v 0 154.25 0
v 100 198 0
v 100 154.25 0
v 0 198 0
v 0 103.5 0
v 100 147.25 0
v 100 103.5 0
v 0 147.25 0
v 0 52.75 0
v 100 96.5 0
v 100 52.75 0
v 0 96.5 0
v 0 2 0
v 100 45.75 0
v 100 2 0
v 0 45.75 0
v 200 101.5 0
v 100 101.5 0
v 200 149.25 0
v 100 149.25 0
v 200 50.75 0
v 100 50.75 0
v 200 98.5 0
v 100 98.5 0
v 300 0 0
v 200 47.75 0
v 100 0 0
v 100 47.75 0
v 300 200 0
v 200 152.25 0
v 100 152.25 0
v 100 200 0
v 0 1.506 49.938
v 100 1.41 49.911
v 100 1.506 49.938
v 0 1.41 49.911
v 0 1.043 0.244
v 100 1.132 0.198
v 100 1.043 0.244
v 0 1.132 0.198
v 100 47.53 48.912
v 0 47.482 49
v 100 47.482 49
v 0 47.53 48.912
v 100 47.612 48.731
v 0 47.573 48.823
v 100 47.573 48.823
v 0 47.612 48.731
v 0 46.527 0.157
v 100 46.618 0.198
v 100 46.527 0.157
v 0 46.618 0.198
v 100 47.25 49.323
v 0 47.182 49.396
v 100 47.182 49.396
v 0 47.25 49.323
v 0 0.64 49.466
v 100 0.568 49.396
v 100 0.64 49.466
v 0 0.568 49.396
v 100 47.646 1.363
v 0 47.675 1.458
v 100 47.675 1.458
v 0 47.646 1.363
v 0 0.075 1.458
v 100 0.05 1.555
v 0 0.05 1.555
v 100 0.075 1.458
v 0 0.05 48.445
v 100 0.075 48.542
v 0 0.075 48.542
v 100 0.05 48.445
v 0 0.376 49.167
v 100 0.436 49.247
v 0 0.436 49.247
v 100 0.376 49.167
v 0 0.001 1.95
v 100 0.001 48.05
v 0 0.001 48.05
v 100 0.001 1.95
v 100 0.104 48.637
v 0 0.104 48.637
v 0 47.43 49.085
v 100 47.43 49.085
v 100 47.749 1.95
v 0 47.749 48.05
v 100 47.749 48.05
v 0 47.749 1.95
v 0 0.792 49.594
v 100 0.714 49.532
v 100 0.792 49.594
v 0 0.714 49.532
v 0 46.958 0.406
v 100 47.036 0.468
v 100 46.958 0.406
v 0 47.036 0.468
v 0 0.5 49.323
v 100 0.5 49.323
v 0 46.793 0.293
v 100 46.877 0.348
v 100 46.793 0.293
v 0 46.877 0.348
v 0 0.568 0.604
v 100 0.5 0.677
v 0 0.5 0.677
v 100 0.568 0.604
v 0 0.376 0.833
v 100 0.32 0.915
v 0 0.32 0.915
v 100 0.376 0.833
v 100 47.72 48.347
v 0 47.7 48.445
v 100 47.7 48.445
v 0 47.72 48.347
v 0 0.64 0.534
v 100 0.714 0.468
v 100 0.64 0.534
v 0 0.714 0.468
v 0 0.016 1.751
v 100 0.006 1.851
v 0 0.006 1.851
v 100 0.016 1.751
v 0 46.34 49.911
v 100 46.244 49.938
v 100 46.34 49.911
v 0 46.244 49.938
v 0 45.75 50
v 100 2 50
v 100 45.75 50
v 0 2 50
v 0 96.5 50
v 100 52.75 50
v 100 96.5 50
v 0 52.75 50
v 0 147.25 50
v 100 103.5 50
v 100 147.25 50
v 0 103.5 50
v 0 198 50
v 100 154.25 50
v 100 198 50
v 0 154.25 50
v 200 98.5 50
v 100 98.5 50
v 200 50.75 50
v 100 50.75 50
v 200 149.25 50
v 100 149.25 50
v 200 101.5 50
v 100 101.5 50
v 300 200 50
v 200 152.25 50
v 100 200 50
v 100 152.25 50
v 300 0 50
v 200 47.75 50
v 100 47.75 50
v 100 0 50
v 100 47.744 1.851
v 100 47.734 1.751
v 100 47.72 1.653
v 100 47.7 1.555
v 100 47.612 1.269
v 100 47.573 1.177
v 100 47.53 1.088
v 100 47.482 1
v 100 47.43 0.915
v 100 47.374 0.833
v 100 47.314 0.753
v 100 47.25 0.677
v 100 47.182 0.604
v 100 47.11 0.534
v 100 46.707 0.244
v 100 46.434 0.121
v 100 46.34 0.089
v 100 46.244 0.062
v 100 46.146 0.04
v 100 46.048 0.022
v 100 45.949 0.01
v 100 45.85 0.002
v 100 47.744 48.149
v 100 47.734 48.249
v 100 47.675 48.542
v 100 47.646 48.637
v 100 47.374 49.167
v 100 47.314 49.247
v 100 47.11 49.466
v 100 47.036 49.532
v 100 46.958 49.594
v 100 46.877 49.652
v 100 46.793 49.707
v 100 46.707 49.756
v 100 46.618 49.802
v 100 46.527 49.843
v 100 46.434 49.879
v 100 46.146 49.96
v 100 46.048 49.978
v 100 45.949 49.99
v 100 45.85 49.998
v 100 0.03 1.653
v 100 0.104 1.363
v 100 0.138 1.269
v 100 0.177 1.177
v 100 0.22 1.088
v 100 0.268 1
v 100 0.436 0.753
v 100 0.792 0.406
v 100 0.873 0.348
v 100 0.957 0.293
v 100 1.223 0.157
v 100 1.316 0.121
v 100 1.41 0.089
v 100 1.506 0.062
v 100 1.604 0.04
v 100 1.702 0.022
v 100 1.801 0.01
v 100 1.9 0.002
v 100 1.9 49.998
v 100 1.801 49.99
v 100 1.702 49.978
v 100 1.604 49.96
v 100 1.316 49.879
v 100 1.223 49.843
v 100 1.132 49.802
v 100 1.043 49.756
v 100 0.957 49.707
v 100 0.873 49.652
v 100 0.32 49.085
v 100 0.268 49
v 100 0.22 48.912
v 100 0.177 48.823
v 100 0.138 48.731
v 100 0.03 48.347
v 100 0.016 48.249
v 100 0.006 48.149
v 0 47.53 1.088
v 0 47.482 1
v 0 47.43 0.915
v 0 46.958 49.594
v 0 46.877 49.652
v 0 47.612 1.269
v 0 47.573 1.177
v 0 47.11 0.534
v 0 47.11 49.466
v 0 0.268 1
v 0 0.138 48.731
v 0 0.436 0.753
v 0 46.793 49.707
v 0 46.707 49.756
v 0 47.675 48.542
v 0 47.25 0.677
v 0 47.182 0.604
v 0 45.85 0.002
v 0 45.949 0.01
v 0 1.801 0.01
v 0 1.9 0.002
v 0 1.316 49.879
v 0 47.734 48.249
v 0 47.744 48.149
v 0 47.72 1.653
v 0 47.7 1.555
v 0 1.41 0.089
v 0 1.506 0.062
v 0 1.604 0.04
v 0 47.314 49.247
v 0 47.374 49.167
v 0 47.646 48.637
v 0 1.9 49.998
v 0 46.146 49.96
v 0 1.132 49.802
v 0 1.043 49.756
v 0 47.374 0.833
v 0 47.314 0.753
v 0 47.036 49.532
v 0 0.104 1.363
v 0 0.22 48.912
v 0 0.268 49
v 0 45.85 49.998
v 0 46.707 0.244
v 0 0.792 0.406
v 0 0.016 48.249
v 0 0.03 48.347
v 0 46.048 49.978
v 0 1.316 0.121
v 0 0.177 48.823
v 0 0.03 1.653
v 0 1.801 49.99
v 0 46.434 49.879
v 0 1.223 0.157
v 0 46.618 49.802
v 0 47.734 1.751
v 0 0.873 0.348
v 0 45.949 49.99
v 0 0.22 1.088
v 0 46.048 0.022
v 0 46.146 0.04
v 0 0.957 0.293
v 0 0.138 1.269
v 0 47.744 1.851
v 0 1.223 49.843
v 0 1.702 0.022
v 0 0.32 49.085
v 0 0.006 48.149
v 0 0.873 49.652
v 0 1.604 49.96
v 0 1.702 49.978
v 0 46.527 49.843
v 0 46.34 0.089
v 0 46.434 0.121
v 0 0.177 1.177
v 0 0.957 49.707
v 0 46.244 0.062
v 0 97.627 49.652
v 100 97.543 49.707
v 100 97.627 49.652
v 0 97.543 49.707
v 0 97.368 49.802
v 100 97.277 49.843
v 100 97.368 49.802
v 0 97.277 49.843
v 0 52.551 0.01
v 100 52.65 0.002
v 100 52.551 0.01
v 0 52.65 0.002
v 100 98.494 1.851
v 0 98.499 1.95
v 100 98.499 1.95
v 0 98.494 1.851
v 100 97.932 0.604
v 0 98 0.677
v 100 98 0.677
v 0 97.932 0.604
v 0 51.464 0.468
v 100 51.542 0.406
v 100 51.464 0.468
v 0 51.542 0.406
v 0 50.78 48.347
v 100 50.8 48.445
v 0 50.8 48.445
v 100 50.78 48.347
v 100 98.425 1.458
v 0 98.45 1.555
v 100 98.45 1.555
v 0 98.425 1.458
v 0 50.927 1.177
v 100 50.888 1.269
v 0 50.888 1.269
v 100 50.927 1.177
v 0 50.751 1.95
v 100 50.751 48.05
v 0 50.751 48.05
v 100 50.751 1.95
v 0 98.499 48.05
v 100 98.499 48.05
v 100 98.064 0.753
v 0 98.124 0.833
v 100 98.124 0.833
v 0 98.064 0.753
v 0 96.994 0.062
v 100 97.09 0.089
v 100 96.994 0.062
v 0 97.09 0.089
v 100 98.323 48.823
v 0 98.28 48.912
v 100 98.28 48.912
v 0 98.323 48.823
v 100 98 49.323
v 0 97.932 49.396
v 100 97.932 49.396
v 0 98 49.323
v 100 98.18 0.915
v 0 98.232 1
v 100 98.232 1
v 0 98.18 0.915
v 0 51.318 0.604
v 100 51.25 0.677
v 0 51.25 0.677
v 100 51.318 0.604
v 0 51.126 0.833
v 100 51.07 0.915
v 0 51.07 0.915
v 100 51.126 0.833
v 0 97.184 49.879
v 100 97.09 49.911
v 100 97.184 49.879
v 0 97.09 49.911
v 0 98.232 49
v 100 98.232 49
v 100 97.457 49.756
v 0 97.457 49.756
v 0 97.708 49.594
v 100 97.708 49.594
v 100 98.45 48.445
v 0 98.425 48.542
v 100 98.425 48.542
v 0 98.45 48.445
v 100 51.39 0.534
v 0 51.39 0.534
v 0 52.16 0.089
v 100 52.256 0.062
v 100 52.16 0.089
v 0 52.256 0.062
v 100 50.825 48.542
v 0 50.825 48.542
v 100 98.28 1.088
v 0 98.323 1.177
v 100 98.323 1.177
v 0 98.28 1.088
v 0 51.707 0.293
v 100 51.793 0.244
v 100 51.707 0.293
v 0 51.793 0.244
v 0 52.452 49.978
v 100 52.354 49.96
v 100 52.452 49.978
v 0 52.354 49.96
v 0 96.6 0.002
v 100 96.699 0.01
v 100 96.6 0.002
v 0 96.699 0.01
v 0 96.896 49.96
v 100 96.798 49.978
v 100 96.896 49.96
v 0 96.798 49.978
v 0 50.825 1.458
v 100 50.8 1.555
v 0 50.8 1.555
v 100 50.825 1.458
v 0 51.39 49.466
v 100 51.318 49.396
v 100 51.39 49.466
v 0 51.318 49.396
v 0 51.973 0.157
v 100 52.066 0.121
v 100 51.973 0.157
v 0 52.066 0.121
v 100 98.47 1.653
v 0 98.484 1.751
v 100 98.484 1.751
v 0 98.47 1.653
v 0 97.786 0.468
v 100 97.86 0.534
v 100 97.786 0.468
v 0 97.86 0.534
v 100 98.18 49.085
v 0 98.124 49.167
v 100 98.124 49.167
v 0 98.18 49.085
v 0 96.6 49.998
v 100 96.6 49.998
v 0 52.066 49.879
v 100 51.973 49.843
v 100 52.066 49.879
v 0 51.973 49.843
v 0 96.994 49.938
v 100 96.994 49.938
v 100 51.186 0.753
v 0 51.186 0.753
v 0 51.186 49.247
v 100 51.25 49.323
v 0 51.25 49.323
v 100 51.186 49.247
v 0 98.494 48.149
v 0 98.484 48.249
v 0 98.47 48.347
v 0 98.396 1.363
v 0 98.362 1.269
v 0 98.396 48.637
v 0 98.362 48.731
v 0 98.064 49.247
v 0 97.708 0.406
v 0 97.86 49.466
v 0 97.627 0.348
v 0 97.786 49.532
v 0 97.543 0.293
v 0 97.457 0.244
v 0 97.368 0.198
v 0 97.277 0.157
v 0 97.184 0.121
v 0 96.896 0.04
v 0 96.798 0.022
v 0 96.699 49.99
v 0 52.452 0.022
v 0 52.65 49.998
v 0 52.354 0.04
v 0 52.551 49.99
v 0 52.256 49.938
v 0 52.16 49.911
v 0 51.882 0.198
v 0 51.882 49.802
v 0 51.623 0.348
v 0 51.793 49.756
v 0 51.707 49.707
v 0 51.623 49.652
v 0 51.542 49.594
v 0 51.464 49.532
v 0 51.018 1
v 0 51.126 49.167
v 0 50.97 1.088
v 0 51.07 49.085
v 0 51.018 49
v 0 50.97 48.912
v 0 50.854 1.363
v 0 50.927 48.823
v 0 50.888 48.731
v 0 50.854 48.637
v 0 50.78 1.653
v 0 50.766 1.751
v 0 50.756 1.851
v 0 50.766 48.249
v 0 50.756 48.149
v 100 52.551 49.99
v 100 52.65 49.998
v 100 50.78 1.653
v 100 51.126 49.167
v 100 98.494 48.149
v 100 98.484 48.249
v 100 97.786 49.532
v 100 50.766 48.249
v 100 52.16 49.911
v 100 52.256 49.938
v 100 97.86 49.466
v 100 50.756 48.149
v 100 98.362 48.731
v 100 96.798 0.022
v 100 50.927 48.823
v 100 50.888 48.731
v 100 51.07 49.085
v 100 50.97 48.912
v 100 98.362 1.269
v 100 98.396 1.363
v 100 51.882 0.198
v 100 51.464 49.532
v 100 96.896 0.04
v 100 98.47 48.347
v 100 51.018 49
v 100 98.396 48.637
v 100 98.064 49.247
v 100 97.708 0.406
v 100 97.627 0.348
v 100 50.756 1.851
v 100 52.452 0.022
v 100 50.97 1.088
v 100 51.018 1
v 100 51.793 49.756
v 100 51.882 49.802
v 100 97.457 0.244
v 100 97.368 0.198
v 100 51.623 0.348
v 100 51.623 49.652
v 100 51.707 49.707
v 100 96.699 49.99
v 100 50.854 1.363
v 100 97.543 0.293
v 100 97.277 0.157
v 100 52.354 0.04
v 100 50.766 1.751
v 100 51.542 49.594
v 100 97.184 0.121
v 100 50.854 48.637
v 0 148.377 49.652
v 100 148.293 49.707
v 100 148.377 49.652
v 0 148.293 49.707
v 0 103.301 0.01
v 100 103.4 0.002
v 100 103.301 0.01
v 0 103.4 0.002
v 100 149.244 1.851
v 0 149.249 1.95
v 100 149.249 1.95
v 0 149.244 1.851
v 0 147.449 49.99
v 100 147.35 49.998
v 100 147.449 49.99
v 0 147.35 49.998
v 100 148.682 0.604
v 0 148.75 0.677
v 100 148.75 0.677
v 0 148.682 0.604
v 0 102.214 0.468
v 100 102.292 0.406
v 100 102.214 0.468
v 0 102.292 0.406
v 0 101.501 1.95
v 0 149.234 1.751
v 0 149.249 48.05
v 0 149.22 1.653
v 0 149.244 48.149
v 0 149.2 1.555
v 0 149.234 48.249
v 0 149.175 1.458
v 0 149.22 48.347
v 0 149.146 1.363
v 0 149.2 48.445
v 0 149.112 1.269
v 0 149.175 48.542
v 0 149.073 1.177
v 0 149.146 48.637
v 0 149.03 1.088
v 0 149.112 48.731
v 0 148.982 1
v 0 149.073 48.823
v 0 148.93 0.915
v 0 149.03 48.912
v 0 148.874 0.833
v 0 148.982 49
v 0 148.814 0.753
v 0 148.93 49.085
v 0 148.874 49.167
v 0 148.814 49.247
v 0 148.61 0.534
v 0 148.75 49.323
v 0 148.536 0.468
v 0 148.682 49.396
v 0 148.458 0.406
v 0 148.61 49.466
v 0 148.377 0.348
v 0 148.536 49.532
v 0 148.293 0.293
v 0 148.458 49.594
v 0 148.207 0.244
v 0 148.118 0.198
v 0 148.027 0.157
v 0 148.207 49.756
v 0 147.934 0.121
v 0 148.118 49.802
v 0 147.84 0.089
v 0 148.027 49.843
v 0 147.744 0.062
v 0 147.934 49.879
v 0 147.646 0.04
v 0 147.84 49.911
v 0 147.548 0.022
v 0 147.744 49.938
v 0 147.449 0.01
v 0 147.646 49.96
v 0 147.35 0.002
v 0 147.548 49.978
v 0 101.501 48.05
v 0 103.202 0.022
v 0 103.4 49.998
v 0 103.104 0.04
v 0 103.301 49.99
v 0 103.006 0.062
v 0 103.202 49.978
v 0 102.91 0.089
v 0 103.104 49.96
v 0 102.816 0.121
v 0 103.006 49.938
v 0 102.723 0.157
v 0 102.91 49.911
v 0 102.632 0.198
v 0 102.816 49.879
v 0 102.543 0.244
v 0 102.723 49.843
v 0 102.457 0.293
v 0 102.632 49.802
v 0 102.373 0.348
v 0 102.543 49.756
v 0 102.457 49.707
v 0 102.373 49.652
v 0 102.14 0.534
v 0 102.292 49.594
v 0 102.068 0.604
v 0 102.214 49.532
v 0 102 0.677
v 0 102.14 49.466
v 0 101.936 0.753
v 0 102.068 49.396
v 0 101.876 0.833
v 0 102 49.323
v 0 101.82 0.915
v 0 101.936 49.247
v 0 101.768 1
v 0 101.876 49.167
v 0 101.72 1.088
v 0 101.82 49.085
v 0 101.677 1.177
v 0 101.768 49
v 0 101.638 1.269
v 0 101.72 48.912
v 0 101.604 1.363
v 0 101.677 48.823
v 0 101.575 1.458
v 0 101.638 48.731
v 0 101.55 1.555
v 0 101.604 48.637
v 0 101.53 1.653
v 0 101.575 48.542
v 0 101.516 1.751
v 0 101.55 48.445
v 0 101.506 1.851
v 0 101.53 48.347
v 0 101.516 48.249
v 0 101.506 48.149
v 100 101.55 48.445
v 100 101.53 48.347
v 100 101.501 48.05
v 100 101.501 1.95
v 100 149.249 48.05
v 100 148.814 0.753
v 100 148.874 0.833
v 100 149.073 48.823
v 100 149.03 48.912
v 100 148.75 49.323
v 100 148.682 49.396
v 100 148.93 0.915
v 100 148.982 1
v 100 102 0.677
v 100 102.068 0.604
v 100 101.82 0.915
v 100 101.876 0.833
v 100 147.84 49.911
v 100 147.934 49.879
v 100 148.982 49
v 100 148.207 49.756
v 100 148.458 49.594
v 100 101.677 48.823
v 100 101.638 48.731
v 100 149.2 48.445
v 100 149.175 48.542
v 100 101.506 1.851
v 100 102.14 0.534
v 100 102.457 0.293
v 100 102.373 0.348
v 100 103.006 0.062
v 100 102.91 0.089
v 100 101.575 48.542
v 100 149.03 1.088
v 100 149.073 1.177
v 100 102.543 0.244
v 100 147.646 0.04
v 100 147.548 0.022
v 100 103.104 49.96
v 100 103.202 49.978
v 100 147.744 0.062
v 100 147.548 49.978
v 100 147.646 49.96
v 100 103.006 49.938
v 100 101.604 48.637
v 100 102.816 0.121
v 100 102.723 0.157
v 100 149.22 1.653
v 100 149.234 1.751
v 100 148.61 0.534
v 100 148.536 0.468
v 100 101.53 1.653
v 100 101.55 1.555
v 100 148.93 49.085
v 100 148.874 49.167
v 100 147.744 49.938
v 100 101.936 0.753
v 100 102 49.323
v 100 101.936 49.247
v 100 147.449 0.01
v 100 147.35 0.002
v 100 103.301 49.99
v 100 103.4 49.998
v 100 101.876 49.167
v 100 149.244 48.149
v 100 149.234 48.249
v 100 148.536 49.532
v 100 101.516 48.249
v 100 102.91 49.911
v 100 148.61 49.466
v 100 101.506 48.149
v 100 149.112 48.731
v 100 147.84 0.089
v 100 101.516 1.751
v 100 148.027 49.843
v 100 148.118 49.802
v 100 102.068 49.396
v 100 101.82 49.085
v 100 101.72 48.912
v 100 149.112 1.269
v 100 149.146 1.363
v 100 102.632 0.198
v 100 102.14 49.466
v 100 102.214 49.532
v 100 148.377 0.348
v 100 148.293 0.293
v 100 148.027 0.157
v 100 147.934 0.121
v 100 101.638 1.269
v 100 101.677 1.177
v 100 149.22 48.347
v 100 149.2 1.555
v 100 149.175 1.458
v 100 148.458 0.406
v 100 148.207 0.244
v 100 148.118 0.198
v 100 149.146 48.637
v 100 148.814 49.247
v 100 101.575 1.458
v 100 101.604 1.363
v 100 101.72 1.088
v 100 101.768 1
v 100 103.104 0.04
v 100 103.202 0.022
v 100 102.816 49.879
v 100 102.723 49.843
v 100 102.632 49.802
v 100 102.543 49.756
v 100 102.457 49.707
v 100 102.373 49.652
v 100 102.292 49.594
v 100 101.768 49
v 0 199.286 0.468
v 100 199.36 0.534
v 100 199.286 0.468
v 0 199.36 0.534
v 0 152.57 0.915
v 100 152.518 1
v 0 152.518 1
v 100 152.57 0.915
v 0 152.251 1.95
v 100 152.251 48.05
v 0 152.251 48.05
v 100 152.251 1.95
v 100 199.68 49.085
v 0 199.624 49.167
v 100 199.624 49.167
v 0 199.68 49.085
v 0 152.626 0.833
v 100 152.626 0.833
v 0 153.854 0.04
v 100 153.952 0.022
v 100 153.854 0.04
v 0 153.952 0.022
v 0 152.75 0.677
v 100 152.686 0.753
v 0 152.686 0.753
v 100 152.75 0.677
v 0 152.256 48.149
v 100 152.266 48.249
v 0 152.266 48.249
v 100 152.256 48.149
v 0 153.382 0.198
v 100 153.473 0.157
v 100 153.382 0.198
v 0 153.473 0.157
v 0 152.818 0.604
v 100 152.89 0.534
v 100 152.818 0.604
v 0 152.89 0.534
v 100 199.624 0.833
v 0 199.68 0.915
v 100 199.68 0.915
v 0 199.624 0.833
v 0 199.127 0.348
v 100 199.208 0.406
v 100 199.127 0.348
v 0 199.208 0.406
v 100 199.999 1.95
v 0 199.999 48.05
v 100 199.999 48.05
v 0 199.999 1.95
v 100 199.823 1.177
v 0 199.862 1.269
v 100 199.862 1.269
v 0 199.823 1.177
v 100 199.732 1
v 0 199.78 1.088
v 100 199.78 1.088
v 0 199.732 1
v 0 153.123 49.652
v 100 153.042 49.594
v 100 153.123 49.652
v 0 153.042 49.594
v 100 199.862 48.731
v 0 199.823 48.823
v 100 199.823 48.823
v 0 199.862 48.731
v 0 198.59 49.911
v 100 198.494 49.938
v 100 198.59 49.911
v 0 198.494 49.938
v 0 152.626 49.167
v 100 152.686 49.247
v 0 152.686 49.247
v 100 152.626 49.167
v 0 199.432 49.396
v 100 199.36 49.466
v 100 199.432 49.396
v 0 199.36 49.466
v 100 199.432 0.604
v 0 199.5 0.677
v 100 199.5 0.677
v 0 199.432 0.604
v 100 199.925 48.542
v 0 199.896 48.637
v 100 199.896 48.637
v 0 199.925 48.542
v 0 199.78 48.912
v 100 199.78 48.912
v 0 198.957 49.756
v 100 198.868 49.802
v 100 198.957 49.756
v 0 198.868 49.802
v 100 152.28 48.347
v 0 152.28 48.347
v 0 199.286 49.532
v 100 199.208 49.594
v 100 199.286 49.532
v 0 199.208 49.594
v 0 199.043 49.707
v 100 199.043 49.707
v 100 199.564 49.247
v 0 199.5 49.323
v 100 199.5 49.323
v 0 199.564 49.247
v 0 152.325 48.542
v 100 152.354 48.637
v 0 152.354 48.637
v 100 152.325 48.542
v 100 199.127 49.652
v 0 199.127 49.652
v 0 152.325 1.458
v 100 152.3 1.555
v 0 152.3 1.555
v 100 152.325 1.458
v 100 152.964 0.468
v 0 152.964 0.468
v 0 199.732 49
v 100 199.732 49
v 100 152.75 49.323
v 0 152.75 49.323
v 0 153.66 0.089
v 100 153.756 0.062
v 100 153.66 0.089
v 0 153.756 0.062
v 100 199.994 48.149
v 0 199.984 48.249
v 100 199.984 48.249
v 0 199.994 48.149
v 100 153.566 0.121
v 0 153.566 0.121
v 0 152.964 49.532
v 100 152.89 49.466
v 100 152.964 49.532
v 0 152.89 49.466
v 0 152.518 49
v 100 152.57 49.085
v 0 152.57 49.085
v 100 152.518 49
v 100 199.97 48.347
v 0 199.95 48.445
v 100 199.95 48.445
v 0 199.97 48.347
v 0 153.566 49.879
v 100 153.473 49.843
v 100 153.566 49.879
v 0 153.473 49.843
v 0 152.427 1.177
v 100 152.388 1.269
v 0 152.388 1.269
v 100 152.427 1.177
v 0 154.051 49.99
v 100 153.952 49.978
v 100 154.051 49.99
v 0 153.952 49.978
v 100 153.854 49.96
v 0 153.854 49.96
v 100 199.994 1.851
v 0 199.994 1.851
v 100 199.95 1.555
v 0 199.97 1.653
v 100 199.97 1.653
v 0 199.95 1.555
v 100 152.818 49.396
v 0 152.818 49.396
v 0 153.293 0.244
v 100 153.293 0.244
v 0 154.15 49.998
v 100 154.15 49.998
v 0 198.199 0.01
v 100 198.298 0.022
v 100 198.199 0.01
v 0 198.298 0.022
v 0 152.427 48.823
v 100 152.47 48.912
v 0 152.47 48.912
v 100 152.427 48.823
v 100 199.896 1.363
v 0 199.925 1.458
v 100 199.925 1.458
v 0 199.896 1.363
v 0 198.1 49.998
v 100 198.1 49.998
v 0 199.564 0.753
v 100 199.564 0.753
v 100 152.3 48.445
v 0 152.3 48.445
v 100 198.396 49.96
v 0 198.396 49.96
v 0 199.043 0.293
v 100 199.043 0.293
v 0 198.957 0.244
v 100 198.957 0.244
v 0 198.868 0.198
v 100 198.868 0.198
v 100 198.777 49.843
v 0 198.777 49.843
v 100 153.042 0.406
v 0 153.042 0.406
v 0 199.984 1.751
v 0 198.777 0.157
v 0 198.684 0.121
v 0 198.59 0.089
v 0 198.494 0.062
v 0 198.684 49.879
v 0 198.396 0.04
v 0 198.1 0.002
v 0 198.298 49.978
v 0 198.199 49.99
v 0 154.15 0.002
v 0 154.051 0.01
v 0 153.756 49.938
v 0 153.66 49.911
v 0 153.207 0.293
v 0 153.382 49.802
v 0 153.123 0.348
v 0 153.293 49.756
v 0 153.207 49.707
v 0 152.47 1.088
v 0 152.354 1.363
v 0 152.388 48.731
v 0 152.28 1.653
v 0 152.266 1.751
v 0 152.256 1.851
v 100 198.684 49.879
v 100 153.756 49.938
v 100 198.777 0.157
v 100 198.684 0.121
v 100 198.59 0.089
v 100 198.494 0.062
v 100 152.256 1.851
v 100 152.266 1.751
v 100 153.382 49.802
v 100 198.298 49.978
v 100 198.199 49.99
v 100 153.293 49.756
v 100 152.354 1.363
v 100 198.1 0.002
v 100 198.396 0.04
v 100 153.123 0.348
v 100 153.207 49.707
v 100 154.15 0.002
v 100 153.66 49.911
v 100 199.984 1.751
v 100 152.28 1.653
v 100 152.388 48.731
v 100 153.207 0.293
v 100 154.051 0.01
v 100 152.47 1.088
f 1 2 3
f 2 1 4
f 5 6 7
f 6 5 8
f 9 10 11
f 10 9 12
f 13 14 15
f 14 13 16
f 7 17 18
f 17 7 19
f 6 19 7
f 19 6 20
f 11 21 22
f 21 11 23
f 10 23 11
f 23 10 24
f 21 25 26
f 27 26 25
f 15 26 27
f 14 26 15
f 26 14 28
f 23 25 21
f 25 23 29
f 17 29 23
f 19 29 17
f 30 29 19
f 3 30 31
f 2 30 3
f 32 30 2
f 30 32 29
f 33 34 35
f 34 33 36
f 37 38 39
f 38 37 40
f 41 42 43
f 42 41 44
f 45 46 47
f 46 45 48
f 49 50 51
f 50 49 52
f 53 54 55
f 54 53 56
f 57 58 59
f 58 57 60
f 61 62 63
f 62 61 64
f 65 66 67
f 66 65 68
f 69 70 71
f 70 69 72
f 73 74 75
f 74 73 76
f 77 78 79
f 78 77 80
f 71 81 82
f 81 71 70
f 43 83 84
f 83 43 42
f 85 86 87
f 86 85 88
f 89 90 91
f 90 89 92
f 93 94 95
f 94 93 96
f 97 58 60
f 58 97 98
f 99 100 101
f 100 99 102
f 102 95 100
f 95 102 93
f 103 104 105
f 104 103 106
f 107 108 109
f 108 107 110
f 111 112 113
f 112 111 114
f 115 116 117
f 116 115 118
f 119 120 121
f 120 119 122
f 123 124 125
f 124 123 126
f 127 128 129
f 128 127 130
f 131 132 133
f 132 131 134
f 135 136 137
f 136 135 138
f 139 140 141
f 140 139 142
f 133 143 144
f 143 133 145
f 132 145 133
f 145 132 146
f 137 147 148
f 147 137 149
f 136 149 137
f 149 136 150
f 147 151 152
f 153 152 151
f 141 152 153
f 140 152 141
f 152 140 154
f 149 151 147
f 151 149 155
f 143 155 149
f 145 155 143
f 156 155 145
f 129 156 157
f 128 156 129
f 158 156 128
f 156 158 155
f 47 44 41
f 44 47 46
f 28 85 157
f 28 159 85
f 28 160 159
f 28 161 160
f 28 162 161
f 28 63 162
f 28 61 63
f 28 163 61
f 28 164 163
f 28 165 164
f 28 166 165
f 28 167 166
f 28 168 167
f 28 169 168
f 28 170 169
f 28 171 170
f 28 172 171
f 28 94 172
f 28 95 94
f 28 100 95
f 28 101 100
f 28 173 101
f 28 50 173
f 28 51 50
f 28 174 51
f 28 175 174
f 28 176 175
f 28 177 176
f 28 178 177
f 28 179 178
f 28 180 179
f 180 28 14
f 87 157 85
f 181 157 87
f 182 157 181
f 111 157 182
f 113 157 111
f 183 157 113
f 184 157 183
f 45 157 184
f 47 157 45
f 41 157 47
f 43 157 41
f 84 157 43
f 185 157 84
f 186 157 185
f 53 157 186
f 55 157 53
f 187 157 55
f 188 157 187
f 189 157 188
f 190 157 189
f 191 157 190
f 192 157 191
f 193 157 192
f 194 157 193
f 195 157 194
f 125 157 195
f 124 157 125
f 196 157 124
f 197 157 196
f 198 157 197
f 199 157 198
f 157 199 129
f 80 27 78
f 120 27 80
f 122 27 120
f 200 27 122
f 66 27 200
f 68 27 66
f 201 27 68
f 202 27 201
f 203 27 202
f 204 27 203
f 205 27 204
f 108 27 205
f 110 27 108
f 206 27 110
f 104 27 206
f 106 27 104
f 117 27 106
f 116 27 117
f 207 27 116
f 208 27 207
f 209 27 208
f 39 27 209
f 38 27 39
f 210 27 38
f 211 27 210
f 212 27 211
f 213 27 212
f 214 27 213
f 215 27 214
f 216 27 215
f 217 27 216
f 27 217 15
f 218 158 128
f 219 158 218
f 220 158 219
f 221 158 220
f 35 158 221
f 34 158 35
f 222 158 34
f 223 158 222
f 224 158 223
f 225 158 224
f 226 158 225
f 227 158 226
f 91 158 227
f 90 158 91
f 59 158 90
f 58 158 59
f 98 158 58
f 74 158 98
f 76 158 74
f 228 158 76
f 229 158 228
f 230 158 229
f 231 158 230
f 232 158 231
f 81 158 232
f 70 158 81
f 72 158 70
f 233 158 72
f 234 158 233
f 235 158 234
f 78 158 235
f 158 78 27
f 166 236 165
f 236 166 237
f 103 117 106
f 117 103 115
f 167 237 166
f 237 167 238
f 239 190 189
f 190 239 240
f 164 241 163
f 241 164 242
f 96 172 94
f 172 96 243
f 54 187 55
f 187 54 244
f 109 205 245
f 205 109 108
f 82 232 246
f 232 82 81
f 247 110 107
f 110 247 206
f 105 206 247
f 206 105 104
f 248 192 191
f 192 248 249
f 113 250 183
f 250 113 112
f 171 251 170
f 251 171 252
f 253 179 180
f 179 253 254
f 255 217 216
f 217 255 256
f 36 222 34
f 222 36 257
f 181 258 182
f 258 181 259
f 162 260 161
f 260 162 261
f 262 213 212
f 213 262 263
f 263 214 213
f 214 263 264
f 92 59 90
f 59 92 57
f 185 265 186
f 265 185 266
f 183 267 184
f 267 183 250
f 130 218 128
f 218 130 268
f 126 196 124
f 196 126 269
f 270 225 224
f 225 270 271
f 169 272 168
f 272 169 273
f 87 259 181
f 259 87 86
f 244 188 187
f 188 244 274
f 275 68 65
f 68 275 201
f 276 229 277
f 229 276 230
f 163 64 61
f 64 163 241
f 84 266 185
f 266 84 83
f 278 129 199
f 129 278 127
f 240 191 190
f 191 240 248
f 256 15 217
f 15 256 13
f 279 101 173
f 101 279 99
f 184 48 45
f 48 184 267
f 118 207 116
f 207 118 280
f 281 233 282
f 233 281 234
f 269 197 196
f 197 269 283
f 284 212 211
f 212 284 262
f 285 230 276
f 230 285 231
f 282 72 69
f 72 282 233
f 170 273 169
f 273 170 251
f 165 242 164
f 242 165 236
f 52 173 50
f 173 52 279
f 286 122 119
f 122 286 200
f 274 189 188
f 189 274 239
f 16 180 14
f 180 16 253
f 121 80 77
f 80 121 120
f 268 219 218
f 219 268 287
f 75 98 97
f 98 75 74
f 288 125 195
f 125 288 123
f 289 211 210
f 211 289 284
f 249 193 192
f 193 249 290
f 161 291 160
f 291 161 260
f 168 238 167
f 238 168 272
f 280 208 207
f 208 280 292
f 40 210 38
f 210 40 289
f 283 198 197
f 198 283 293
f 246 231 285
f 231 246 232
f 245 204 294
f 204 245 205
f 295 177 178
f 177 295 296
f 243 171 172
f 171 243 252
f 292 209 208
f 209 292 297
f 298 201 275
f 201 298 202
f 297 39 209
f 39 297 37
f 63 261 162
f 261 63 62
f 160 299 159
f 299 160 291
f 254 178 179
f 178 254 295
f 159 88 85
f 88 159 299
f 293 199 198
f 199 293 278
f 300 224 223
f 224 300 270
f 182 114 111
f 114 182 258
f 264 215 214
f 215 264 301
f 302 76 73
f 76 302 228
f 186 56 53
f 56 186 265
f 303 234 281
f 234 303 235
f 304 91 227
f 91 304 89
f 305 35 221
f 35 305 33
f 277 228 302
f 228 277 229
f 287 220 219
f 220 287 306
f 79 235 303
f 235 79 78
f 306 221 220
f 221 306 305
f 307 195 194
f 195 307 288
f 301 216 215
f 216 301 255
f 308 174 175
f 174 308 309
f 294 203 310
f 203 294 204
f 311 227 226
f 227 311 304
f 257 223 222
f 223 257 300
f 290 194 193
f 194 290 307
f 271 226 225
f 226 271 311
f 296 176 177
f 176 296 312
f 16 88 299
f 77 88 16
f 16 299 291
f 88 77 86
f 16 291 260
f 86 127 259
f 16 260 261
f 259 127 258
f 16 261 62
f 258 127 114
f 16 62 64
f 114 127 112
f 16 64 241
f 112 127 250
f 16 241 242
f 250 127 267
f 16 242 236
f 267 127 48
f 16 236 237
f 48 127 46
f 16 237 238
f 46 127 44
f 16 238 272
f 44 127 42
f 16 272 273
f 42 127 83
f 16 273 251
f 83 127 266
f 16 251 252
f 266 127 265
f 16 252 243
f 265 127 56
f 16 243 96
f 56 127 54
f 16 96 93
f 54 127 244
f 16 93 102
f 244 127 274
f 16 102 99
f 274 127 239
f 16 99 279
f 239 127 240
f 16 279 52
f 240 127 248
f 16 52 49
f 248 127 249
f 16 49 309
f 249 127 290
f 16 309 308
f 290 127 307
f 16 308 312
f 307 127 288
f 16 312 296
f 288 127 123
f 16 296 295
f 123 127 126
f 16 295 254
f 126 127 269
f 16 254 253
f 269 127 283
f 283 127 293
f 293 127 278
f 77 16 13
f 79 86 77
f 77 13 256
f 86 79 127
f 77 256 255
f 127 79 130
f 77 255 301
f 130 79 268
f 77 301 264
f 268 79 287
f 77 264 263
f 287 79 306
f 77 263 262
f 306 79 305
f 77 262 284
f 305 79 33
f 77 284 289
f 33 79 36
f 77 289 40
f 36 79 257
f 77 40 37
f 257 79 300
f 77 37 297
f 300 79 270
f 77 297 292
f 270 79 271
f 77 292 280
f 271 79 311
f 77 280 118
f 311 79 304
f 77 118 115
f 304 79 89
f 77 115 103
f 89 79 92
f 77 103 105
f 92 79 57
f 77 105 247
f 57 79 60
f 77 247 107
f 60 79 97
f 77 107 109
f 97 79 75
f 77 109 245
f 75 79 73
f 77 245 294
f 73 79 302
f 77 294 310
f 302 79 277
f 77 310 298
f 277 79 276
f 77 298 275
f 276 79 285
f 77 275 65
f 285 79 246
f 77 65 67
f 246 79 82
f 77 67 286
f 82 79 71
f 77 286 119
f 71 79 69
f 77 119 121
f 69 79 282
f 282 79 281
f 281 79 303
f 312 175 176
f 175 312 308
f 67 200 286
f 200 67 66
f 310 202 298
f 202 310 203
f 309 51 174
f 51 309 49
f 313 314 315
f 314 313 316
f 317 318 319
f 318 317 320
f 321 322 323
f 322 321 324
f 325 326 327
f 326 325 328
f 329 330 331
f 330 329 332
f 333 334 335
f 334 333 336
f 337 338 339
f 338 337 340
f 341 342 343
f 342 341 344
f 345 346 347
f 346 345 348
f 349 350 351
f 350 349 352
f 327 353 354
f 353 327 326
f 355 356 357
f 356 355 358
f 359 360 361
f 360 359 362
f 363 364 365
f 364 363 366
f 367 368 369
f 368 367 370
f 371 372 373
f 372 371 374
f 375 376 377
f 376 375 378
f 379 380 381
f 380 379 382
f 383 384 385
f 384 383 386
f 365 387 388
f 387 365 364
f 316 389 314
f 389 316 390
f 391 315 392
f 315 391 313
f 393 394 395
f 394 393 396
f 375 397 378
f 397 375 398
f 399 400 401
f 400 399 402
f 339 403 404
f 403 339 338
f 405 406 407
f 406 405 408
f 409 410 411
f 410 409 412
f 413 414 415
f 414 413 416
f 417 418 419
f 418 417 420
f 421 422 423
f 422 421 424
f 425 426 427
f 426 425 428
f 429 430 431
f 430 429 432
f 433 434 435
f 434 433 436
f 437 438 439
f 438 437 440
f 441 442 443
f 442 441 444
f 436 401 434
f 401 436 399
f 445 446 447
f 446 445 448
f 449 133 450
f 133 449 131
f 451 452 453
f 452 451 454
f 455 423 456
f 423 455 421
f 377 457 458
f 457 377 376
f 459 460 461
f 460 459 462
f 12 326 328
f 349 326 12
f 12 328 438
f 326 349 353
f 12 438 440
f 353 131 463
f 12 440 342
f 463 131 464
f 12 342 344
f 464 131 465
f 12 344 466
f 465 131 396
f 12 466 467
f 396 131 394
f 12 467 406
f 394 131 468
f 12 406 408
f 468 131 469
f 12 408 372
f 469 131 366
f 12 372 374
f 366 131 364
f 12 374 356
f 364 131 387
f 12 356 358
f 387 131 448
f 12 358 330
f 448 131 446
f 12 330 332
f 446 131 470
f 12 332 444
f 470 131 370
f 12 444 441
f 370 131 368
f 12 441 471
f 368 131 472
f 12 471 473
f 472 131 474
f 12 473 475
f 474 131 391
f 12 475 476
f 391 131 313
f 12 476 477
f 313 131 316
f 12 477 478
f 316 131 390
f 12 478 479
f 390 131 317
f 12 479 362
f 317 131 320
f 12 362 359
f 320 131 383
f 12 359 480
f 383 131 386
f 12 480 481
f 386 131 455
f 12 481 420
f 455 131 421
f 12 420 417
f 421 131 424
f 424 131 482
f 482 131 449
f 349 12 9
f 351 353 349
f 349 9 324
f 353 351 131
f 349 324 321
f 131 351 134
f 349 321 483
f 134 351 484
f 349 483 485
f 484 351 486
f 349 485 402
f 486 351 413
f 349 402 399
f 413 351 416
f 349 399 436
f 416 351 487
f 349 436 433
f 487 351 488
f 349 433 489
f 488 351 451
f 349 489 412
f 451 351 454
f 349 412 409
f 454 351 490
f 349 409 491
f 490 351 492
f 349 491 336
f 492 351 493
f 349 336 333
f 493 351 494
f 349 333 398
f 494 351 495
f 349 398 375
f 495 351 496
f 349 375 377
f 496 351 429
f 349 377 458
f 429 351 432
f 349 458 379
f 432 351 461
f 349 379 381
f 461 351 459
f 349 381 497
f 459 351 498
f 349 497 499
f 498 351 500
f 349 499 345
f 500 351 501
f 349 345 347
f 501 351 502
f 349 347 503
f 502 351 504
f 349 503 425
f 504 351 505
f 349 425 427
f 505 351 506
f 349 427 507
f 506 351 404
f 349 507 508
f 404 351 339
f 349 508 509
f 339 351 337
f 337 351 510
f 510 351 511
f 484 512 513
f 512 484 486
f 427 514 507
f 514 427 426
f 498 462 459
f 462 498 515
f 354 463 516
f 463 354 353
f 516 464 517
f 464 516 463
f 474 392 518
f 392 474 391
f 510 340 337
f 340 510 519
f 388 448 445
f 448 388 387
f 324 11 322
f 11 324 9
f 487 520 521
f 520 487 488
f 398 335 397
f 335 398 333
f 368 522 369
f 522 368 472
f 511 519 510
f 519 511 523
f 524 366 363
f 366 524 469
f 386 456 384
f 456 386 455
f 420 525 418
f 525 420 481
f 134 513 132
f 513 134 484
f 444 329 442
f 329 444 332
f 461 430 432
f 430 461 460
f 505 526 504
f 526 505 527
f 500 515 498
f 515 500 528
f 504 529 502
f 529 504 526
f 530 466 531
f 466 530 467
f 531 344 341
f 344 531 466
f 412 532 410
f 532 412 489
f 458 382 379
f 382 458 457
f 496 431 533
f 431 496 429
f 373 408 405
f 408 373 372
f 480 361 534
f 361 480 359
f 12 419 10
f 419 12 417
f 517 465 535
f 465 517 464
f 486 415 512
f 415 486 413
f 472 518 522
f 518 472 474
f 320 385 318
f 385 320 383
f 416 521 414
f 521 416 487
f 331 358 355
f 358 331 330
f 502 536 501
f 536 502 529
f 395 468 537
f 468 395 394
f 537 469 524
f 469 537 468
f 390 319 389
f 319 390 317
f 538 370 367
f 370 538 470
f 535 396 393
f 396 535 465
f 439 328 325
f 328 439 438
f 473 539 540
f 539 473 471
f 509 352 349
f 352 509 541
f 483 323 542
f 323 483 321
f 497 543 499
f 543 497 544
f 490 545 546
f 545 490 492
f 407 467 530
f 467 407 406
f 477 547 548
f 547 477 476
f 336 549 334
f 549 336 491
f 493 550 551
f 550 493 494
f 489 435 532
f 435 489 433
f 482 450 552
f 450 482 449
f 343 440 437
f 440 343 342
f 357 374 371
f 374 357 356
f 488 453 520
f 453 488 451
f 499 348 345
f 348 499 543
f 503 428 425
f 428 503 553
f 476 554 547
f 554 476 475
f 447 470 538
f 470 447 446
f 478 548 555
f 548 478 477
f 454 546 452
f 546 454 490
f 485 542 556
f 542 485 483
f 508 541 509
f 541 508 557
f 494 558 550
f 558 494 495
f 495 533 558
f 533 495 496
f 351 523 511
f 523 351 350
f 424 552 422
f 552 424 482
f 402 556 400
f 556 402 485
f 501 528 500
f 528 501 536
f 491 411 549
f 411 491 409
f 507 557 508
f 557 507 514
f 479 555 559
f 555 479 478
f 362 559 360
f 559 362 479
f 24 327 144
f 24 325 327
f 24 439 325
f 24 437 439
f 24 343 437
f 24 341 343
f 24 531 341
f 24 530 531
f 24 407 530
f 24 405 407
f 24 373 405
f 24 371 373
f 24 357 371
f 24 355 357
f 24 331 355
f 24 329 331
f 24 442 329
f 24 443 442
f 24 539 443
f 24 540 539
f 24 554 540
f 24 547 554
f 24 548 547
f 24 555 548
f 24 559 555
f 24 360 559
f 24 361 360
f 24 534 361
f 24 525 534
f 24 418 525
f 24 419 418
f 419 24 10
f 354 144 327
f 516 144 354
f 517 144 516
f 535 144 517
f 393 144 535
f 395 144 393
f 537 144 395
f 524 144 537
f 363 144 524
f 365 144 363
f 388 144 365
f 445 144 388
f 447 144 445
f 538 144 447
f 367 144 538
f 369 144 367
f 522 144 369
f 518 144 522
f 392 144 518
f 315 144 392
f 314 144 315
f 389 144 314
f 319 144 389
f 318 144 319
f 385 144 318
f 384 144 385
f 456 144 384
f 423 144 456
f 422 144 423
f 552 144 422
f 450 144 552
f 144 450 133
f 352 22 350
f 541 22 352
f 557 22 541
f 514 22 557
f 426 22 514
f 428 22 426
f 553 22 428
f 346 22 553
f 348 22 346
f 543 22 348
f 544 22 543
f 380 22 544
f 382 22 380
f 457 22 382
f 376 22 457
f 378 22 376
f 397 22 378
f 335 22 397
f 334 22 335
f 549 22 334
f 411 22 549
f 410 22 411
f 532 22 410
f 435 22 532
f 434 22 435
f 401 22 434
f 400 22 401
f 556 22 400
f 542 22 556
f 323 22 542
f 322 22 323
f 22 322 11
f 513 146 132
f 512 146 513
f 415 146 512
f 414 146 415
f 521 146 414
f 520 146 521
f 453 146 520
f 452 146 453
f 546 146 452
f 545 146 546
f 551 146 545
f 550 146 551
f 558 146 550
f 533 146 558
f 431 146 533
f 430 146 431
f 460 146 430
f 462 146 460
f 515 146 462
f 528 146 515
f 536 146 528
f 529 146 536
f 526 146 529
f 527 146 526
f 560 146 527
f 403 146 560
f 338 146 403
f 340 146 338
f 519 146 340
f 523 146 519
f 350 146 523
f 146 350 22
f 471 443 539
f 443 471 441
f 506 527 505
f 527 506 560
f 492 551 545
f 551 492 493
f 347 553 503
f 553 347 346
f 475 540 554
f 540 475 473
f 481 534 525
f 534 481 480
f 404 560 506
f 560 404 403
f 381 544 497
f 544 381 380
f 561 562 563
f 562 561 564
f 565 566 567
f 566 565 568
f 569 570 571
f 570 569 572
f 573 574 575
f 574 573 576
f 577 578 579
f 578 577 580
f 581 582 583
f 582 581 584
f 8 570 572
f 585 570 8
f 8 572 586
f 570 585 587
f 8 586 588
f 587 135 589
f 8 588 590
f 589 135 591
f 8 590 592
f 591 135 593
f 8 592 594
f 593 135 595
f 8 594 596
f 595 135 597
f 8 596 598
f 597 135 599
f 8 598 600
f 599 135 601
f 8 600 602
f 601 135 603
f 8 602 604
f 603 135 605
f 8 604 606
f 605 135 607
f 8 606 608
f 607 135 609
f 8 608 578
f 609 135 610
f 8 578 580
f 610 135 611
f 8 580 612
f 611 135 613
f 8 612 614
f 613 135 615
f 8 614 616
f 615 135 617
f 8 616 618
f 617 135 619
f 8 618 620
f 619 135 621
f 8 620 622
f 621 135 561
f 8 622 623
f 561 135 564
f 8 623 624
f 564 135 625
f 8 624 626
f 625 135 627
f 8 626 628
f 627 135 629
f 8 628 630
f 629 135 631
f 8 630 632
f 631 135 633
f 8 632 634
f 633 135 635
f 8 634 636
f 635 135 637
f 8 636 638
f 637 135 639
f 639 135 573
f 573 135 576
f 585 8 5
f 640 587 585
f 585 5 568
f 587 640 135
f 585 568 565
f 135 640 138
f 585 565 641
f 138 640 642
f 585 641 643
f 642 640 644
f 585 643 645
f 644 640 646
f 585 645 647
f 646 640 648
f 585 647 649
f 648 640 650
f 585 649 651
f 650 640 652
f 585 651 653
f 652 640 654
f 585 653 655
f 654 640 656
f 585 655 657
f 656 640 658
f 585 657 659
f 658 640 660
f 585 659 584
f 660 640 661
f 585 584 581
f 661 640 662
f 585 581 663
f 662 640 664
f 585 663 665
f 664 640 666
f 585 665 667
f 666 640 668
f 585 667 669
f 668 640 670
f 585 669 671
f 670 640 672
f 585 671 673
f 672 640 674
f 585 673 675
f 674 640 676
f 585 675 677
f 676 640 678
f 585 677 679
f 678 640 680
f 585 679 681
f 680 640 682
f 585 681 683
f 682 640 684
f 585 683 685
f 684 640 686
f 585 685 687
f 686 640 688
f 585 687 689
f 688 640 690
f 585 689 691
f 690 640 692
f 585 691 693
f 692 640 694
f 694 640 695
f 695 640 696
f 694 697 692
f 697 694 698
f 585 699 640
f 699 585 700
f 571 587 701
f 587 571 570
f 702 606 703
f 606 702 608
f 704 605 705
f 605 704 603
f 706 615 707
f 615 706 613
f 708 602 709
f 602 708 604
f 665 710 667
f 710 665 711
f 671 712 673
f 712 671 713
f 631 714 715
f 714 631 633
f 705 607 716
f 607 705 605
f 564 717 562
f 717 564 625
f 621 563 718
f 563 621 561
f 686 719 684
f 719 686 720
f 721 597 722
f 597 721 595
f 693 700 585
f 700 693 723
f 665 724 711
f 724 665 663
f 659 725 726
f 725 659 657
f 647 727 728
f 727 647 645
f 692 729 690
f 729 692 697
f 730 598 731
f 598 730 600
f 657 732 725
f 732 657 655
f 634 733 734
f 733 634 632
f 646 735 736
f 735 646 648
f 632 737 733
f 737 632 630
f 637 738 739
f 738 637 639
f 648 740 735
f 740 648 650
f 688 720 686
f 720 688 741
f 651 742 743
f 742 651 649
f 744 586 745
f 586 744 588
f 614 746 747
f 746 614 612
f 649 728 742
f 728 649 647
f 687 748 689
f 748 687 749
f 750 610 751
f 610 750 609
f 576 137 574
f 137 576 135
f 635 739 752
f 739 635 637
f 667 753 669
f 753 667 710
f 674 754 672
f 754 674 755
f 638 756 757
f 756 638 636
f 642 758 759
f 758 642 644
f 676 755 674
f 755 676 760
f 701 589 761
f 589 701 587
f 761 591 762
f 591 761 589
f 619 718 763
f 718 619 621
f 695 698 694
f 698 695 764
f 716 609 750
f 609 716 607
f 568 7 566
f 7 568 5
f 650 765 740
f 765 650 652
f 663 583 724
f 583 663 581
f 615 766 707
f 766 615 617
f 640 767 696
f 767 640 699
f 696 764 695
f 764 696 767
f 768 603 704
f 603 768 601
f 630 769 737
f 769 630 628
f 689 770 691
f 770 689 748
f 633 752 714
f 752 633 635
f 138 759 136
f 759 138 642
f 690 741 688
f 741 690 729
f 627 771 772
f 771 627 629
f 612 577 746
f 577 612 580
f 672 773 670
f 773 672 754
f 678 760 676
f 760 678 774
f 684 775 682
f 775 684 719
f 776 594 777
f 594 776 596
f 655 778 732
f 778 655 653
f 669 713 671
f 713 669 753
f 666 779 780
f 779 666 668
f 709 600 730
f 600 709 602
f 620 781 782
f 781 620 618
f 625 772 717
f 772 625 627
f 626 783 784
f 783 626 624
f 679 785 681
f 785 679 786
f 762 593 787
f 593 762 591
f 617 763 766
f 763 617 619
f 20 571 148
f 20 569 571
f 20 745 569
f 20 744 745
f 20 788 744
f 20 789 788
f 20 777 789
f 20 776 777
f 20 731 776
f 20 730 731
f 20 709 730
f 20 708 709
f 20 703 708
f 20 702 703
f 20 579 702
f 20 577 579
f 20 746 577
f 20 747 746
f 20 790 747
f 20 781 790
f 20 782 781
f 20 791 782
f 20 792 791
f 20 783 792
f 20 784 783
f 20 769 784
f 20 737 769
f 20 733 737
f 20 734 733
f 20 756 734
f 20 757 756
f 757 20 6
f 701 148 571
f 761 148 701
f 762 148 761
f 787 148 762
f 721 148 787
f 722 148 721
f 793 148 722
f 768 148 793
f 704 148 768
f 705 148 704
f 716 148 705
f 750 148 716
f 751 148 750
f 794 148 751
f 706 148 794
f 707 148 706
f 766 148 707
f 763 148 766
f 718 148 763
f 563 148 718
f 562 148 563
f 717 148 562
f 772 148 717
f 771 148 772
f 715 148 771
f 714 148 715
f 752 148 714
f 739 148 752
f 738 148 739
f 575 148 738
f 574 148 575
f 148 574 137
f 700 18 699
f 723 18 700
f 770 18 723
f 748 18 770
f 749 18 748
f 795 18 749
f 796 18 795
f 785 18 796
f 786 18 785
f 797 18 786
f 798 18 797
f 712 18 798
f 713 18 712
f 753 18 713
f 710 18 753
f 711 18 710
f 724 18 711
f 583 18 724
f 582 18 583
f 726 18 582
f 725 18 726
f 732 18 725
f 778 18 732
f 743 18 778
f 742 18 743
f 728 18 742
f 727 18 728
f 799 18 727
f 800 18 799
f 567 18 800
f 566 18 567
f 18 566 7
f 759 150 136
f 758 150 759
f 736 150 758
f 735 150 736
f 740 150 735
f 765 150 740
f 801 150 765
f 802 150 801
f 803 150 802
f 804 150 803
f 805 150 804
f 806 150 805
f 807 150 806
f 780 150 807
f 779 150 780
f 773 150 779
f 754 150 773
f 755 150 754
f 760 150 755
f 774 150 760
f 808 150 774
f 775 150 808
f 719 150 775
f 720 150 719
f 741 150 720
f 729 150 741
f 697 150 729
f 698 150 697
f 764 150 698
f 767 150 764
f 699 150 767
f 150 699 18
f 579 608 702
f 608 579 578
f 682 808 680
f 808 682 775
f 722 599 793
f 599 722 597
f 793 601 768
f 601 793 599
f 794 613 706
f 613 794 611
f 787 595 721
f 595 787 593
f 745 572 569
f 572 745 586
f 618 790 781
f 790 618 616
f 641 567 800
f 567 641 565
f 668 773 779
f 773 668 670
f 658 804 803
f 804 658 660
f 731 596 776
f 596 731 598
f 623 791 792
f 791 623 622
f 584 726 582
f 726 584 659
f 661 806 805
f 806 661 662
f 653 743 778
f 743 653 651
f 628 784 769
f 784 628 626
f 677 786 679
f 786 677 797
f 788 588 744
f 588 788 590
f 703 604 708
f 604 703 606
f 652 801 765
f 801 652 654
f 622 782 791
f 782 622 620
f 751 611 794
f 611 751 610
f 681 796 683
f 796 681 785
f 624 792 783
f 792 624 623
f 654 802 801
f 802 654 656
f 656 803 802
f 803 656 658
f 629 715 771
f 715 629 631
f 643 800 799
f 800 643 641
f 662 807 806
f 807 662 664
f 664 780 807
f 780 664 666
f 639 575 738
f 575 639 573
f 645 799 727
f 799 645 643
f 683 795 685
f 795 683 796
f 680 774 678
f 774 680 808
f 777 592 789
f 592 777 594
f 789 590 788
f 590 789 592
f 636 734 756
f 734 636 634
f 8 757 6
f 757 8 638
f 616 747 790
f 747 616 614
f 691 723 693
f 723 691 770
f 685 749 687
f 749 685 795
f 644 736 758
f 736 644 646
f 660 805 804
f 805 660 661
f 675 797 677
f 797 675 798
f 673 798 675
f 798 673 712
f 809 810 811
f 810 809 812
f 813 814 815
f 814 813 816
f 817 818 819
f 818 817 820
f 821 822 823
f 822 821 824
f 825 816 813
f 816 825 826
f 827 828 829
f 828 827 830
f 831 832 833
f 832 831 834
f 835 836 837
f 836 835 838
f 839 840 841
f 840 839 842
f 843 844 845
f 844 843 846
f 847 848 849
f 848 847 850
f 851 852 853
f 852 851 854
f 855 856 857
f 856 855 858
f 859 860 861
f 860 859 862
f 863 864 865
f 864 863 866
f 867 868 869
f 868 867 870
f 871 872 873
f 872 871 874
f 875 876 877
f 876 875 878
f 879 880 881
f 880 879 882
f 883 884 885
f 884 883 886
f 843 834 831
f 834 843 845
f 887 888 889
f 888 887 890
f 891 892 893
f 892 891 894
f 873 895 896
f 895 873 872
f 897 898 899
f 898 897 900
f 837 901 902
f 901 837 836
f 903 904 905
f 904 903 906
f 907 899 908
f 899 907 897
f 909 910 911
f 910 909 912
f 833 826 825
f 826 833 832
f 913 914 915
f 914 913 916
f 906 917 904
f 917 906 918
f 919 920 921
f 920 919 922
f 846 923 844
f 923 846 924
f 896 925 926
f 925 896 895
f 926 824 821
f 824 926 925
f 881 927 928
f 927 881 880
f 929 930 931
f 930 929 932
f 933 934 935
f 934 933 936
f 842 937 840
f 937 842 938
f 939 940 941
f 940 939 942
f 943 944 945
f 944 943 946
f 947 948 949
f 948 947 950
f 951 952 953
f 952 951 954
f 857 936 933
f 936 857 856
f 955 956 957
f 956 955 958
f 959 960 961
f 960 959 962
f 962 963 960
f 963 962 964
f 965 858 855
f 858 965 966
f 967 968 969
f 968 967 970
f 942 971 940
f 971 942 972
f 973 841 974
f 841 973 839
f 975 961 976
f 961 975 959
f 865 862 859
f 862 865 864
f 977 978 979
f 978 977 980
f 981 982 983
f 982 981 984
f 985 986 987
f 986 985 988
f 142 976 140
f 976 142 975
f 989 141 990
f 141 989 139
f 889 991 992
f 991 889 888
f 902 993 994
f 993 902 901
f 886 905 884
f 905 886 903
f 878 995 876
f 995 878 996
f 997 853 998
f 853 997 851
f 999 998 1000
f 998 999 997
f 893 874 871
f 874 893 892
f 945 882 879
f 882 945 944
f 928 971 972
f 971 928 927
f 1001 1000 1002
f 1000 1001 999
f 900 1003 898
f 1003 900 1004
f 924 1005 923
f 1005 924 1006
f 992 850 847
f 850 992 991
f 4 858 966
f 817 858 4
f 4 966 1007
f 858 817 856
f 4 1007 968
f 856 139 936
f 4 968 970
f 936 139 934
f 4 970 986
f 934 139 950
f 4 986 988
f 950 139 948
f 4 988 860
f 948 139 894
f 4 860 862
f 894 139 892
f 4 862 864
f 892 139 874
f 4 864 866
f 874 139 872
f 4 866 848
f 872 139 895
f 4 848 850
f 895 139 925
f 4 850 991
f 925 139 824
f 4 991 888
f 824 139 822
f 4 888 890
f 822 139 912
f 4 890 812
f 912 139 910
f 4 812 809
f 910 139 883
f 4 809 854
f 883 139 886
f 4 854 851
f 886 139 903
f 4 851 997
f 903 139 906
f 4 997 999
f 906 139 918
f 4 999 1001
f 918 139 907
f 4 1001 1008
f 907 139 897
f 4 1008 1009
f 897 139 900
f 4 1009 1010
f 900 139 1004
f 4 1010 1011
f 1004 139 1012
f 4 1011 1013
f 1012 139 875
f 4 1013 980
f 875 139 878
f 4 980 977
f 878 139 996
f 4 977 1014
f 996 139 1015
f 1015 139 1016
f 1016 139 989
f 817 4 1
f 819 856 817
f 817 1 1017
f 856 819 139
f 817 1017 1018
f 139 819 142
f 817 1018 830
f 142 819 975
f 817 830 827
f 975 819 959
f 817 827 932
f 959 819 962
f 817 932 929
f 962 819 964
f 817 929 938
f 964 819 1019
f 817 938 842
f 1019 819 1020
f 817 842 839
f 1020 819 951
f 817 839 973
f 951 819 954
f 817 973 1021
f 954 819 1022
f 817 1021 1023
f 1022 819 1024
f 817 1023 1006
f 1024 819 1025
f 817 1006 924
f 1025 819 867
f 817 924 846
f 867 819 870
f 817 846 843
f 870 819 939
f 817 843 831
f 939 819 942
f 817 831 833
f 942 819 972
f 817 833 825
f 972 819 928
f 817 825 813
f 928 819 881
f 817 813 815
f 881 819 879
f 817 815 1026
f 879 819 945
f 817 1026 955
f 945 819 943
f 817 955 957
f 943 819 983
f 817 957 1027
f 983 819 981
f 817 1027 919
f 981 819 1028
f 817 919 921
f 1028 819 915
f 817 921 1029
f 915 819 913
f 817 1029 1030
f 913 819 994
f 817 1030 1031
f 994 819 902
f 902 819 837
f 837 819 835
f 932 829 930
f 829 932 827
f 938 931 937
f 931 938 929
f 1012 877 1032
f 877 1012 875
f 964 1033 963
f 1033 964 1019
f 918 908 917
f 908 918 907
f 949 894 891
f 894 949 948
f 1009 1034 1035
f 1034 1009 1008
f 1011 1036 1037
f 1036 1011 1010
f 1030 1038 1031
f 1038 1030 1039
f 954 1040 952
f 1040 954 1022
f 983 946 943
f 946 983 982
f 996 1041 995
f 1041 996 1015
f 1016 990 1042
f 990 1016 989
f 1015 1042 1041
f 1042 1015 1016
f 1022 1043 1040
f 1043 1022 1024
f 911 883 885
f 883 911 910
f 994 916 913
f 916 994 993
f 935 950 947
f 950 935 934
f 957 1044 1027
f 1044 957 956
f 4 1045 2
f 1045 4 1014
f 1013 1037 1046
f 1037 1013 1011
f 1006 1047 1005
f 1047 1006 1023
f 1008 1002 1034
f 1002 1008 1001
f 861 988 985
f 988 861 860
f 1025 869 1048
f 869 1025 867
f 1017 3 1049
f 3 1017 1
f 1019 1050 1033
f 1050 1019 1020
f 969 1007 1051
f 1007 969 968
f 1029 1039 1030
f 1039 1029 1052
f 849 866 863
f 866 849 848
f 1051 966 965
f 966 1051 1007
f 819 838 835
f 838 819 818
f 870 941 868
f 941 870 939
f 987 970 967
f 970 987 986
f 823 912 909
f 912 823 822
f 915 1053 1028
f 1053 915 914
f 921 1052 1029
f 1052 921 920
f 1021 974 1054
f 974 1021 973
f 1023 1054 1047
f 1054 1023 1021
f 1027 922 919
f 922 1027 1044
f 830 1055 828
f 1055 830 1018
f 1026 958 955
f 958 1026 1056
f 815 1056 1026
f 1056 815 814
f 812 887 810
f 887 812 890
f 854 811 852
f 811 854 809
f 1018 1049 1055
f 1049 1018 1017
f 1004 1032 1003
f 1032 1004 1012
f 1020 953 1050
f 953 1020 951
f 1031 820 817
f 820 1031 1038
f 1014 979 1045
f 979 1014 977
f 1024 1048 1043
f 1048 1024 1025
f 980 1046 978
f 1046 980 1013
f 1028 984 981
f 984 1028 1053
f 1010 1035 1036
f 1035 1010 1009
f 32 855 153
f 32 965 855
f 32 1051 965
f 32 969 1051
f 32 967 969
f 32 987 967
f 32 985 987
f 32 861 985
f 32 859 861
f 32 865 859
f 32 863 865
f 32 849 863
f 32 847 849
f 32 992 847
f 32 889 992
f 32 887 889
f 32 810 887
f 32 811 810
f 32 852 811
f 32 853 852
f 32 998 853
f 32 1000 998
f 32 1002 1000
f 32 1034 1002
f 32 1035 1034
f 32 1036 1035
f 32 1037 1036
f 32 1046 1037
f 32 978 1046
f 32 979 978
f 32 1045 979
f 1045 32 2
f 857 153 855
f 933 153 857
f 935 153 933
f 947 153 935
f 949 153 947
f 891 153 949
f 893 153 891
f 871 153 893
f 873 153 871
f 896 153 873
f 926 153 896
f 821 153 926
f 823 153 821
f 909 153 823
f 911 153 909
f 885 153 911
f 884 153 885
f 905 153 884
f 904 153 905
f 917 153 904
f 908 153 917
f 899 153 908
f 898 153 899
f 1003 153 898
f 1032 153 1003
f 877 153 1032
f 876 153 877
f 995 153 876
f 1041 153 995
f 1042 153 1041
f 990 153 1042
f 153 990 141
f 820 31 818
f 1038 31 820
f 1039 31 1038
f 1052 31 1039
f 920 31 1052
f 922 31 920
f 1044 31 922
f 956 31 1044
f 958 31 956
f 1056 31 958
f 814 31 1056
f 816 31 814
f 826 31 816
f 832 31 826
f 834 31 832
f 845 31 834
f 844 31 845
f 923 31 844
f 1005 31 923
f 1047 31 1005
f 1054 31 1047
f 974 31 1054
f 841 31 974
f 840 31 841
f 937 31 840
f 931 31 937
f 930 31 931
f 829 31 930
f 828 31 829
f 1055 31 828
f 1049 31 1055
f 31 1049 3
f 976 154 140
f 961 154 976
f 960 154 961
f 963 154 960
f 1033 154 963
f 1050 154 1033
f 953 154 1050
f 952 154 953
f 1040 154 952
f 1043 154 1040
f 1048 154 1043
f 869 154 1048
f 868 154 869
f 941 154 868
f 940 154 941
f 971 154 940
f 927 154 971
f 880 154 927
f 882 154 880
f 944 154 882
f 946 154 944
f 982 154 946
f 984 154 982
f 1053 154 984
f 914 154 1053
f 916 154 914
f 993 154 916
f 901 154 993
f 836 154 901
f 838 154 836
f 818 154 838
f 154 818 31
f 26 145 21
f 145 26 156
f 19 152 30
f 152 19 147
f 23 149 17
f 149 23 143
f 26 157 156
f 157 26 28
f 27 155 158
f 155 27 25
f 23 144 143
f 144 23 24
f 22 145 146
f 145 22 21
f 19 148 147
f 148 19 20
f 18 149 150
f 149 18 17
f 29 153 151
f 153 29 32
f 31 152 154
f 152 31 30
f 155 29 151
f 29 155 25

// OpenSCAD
// file: vendors/UtilitySCAD-R1/utility.scad
/*This library, part of UtilitySCAD, is placed into the public domain by NMR_Scientist.

Version: R1
Title: UtilitySCAD
Description: Miscellaneous utility modules I developed over the course of several projects to reuse common operations that were seen over various models.

History:
* ??/??/2024 - R1 - First release to be with a model whenever it is released.
*/

$fa = 1;
$fs = 0.1;

use <MCAD/regular_shapes.scad>;

//Move objects in the x-axis.
module move_x (x)
{
    translate([x,0,0])
    {
        children();
    }
}

//Move objects in the y-axis
module move_y (y)
{
    translate([0,y,0])
    {
        children();
    }
}

//Move objects in the z-ax
module move_z (z)
{
    translate([0,0,z])
    {
        children();
    }
}

//Move objects by a given point in all direction. -1 would means moving to the left, moving back, and moving down by one point.
module move_by(point)
{
    translate([point,point,point])
    {
        children();
    }
}

//Exactly like move_by, but a negation. Named for its very common use in adding tolerance to objects.
module move_by_margin(m)
{
    move_by(-m)
    {
        children();
    }
}

//A cylinder rotated to its side.
module hor_cylinder(width,r,r)
{
    move_y(r)
        move_z(r)
            rotate([0,90,0])
            {
                cylinder(width,r,r);
            }
}

module hor_cylinder_y(length,r)
{
    translate([r * 2,0,0])
    {
        rotate([0,0,90])
        {
            hor_cylinder(length,r);
        }
    }
}


//Cut a object at a given height and then move that object down, usually to zero if the object was placed at zero height.
module hor_cut(width,length,height)
{
    translate([0,0,-height])
    {
        difference()
        {
            children();
            translate([-1,-1,-1])
            {
                cube([width + 2,length + 2,height + 1]);
            }
        }
    }
}

function bevel_radius(length) = length * 2 / 3;
function bevel_height(r) = r * sqrt(3)/2;

//Bevel at 45 degree slope up, facing back, then extrude upward by height.
module bevel_up_back_45(width,length,height)
{
    r = bevel_radius(length);
    z = bevel_height(r);
    m = 0.1;
    m_2 = m * 2;
    difference()
    {
        translate([0,r / 2,z])
        {
            rotate([0,90,0])
            {
                triangle_prism(width,r);
            }
        }
        // Cut off to the required height.
        move_x(-m)
            move_y(-m)
                move_z(height)
                   cube([width + m,length + m,z * 2 - height]);
    }
    //If cutting off isn't happening simply add height.
    if (height >= z)
    {
        move_z(z)
        {
            cube([width,length,height - z]);
        }
    }
}

module bevel_up_front_45(width,length,height)
{
    r = bevel_radius(length);
    z = bevel_height(r);
    m = 0.1;
    m_2 = m * 2;
    difference()
    {
        translate([width,r,z])
        {
            rotate([0,90,180])
            {
                triangle_prism(width,r);
            }
        }
        // Cut off to the required height.
        move_x(-m)
            move_y(-m)
                move_z(height)
                   cube([width + m,length + m,z * 2 - height]);
    }
    //If cutting off isn't happening simply add height.
    if (height >= z)
    {
        move_z(z)
        {
            cube([width,length,height - z]);
        }
    }
}

module center_z(centering_z,target_z)
{
    z = (target_z - centering_z) / 2;
    translate([0,0,z])
    {
        children();
    }
}

module center_y(centering_y,target_y)
{
    y = (target_y - centering_y) / 2;
    translate([0,y,0])
    {
        children();
    }
}

//Center an object against a particular width of another object.
module center(centering_w,target_w)
{
    x = (target_w - centering_w) / 2;
    translate([x,0,0])
    {
        children();
    }
}

//Move object to a certain value of x, but also account for the object size, such that the object is place before the point x. For a postive value of x, that is before the x, for a negative value of x, that is next to x. Useful for dimensional accurate placement.
module move_object_x(x,r)
{
    diameter = r * 2;
    if (abs(x) < diameter)
    {
        echo("Cannot move!");
    }
    else
    {
        if (x > 0)
        {
            move_x(x - diameter)
            {
                children();
            }
        }
        else if (x < 0)
        {
            move_x(x + diameter)
                children();
        }
    }
}


//Move object to a certain value of z, but also account for the object size, such that the object is place before the point z. For a postive value of z, that is below of z, for a negative value of z, that is above z. Useful for dimensional accurate placement.
module move_object_z(z, r)
{
    diameter = r * 2;
    if (abs(z) < diameter)
    {
        echo("Cannot move!");
    }
    else
    {
        if (z > 0)
        {
            move_z(z - diameter)
            {
                children();
            }
        }
        else if (z < 0)
        {
            move_z(z + diameter)
                children();
        }
    }
}


//Generaate all notches in a castellation at the same time, and space each notch for the length of the notch.
module notches(n, multipler)
{
    for (x = [1:n])
    {
        final_x = (x - 1) * multipler;
        move_x(final_x)
        {
            if ((x - 1) % 2 == 0)
            {
               children();
            }
        }
    }
}

//Get the total width of the Castellation, starting with the first and last notches.
function CastellateTotalW(w,size) = (w - 1) % 2 == 1 ? (w - 1) * size.x : w * size.x;


//Center the resulting castellation of a certain cuboid size.
module castellate(width,size, m = 0)
{
    total_notches = floor(width / size.x);
    total_w = CastellateTotalW(total_notches,size);
    center(total_w,width)
    {
        notches(total_notches,size.x)
        {
            move_x(m)
            {
                shrink = [size.x - (m * 2),size.y,size.z];
                cube(shrink);
            }
        }
    }

}
// main file
$fa = 1;
$fs = 0.1;


use <vendors/UtilitySCAD-R1/utility.scad>;

width = 100;
length = 200;
height = 50;
thickness = 3;
divider = 4;
function divide_by_y(target_l,center_l,times) = (target_l - center_l * (times - 1)) / times;

small_l = divide_by_y(length,thickness,divider);

r = 2;
for(i=[0:1:divider - 1])
{
    translate([0,(small_l + thickness) * i,0])
    {
        hull()
        {
            hor_cylinder(width,r);
            translate([0,0,height - (r * 2)])
            {
            hor_cylinder(width,r);
            }
            translate([0,small_l - (r * 2),0])
            {
                hor_cylinder(width,r);
                translate([0,0,height - (r * 2)])
                {
                    hor_cylinder(width,r);
                }
            }
        }
    }
}
translate([width,0,0])
{
    for(i=[0:1:divider - 1])
    {
        translate([0,(small_l + thickness) * i,0])
        {
            cube([width,small_l,height]);
        }
    }
}
translate([width * 2,0,0])
{
    cube([width,length,height]);

}
